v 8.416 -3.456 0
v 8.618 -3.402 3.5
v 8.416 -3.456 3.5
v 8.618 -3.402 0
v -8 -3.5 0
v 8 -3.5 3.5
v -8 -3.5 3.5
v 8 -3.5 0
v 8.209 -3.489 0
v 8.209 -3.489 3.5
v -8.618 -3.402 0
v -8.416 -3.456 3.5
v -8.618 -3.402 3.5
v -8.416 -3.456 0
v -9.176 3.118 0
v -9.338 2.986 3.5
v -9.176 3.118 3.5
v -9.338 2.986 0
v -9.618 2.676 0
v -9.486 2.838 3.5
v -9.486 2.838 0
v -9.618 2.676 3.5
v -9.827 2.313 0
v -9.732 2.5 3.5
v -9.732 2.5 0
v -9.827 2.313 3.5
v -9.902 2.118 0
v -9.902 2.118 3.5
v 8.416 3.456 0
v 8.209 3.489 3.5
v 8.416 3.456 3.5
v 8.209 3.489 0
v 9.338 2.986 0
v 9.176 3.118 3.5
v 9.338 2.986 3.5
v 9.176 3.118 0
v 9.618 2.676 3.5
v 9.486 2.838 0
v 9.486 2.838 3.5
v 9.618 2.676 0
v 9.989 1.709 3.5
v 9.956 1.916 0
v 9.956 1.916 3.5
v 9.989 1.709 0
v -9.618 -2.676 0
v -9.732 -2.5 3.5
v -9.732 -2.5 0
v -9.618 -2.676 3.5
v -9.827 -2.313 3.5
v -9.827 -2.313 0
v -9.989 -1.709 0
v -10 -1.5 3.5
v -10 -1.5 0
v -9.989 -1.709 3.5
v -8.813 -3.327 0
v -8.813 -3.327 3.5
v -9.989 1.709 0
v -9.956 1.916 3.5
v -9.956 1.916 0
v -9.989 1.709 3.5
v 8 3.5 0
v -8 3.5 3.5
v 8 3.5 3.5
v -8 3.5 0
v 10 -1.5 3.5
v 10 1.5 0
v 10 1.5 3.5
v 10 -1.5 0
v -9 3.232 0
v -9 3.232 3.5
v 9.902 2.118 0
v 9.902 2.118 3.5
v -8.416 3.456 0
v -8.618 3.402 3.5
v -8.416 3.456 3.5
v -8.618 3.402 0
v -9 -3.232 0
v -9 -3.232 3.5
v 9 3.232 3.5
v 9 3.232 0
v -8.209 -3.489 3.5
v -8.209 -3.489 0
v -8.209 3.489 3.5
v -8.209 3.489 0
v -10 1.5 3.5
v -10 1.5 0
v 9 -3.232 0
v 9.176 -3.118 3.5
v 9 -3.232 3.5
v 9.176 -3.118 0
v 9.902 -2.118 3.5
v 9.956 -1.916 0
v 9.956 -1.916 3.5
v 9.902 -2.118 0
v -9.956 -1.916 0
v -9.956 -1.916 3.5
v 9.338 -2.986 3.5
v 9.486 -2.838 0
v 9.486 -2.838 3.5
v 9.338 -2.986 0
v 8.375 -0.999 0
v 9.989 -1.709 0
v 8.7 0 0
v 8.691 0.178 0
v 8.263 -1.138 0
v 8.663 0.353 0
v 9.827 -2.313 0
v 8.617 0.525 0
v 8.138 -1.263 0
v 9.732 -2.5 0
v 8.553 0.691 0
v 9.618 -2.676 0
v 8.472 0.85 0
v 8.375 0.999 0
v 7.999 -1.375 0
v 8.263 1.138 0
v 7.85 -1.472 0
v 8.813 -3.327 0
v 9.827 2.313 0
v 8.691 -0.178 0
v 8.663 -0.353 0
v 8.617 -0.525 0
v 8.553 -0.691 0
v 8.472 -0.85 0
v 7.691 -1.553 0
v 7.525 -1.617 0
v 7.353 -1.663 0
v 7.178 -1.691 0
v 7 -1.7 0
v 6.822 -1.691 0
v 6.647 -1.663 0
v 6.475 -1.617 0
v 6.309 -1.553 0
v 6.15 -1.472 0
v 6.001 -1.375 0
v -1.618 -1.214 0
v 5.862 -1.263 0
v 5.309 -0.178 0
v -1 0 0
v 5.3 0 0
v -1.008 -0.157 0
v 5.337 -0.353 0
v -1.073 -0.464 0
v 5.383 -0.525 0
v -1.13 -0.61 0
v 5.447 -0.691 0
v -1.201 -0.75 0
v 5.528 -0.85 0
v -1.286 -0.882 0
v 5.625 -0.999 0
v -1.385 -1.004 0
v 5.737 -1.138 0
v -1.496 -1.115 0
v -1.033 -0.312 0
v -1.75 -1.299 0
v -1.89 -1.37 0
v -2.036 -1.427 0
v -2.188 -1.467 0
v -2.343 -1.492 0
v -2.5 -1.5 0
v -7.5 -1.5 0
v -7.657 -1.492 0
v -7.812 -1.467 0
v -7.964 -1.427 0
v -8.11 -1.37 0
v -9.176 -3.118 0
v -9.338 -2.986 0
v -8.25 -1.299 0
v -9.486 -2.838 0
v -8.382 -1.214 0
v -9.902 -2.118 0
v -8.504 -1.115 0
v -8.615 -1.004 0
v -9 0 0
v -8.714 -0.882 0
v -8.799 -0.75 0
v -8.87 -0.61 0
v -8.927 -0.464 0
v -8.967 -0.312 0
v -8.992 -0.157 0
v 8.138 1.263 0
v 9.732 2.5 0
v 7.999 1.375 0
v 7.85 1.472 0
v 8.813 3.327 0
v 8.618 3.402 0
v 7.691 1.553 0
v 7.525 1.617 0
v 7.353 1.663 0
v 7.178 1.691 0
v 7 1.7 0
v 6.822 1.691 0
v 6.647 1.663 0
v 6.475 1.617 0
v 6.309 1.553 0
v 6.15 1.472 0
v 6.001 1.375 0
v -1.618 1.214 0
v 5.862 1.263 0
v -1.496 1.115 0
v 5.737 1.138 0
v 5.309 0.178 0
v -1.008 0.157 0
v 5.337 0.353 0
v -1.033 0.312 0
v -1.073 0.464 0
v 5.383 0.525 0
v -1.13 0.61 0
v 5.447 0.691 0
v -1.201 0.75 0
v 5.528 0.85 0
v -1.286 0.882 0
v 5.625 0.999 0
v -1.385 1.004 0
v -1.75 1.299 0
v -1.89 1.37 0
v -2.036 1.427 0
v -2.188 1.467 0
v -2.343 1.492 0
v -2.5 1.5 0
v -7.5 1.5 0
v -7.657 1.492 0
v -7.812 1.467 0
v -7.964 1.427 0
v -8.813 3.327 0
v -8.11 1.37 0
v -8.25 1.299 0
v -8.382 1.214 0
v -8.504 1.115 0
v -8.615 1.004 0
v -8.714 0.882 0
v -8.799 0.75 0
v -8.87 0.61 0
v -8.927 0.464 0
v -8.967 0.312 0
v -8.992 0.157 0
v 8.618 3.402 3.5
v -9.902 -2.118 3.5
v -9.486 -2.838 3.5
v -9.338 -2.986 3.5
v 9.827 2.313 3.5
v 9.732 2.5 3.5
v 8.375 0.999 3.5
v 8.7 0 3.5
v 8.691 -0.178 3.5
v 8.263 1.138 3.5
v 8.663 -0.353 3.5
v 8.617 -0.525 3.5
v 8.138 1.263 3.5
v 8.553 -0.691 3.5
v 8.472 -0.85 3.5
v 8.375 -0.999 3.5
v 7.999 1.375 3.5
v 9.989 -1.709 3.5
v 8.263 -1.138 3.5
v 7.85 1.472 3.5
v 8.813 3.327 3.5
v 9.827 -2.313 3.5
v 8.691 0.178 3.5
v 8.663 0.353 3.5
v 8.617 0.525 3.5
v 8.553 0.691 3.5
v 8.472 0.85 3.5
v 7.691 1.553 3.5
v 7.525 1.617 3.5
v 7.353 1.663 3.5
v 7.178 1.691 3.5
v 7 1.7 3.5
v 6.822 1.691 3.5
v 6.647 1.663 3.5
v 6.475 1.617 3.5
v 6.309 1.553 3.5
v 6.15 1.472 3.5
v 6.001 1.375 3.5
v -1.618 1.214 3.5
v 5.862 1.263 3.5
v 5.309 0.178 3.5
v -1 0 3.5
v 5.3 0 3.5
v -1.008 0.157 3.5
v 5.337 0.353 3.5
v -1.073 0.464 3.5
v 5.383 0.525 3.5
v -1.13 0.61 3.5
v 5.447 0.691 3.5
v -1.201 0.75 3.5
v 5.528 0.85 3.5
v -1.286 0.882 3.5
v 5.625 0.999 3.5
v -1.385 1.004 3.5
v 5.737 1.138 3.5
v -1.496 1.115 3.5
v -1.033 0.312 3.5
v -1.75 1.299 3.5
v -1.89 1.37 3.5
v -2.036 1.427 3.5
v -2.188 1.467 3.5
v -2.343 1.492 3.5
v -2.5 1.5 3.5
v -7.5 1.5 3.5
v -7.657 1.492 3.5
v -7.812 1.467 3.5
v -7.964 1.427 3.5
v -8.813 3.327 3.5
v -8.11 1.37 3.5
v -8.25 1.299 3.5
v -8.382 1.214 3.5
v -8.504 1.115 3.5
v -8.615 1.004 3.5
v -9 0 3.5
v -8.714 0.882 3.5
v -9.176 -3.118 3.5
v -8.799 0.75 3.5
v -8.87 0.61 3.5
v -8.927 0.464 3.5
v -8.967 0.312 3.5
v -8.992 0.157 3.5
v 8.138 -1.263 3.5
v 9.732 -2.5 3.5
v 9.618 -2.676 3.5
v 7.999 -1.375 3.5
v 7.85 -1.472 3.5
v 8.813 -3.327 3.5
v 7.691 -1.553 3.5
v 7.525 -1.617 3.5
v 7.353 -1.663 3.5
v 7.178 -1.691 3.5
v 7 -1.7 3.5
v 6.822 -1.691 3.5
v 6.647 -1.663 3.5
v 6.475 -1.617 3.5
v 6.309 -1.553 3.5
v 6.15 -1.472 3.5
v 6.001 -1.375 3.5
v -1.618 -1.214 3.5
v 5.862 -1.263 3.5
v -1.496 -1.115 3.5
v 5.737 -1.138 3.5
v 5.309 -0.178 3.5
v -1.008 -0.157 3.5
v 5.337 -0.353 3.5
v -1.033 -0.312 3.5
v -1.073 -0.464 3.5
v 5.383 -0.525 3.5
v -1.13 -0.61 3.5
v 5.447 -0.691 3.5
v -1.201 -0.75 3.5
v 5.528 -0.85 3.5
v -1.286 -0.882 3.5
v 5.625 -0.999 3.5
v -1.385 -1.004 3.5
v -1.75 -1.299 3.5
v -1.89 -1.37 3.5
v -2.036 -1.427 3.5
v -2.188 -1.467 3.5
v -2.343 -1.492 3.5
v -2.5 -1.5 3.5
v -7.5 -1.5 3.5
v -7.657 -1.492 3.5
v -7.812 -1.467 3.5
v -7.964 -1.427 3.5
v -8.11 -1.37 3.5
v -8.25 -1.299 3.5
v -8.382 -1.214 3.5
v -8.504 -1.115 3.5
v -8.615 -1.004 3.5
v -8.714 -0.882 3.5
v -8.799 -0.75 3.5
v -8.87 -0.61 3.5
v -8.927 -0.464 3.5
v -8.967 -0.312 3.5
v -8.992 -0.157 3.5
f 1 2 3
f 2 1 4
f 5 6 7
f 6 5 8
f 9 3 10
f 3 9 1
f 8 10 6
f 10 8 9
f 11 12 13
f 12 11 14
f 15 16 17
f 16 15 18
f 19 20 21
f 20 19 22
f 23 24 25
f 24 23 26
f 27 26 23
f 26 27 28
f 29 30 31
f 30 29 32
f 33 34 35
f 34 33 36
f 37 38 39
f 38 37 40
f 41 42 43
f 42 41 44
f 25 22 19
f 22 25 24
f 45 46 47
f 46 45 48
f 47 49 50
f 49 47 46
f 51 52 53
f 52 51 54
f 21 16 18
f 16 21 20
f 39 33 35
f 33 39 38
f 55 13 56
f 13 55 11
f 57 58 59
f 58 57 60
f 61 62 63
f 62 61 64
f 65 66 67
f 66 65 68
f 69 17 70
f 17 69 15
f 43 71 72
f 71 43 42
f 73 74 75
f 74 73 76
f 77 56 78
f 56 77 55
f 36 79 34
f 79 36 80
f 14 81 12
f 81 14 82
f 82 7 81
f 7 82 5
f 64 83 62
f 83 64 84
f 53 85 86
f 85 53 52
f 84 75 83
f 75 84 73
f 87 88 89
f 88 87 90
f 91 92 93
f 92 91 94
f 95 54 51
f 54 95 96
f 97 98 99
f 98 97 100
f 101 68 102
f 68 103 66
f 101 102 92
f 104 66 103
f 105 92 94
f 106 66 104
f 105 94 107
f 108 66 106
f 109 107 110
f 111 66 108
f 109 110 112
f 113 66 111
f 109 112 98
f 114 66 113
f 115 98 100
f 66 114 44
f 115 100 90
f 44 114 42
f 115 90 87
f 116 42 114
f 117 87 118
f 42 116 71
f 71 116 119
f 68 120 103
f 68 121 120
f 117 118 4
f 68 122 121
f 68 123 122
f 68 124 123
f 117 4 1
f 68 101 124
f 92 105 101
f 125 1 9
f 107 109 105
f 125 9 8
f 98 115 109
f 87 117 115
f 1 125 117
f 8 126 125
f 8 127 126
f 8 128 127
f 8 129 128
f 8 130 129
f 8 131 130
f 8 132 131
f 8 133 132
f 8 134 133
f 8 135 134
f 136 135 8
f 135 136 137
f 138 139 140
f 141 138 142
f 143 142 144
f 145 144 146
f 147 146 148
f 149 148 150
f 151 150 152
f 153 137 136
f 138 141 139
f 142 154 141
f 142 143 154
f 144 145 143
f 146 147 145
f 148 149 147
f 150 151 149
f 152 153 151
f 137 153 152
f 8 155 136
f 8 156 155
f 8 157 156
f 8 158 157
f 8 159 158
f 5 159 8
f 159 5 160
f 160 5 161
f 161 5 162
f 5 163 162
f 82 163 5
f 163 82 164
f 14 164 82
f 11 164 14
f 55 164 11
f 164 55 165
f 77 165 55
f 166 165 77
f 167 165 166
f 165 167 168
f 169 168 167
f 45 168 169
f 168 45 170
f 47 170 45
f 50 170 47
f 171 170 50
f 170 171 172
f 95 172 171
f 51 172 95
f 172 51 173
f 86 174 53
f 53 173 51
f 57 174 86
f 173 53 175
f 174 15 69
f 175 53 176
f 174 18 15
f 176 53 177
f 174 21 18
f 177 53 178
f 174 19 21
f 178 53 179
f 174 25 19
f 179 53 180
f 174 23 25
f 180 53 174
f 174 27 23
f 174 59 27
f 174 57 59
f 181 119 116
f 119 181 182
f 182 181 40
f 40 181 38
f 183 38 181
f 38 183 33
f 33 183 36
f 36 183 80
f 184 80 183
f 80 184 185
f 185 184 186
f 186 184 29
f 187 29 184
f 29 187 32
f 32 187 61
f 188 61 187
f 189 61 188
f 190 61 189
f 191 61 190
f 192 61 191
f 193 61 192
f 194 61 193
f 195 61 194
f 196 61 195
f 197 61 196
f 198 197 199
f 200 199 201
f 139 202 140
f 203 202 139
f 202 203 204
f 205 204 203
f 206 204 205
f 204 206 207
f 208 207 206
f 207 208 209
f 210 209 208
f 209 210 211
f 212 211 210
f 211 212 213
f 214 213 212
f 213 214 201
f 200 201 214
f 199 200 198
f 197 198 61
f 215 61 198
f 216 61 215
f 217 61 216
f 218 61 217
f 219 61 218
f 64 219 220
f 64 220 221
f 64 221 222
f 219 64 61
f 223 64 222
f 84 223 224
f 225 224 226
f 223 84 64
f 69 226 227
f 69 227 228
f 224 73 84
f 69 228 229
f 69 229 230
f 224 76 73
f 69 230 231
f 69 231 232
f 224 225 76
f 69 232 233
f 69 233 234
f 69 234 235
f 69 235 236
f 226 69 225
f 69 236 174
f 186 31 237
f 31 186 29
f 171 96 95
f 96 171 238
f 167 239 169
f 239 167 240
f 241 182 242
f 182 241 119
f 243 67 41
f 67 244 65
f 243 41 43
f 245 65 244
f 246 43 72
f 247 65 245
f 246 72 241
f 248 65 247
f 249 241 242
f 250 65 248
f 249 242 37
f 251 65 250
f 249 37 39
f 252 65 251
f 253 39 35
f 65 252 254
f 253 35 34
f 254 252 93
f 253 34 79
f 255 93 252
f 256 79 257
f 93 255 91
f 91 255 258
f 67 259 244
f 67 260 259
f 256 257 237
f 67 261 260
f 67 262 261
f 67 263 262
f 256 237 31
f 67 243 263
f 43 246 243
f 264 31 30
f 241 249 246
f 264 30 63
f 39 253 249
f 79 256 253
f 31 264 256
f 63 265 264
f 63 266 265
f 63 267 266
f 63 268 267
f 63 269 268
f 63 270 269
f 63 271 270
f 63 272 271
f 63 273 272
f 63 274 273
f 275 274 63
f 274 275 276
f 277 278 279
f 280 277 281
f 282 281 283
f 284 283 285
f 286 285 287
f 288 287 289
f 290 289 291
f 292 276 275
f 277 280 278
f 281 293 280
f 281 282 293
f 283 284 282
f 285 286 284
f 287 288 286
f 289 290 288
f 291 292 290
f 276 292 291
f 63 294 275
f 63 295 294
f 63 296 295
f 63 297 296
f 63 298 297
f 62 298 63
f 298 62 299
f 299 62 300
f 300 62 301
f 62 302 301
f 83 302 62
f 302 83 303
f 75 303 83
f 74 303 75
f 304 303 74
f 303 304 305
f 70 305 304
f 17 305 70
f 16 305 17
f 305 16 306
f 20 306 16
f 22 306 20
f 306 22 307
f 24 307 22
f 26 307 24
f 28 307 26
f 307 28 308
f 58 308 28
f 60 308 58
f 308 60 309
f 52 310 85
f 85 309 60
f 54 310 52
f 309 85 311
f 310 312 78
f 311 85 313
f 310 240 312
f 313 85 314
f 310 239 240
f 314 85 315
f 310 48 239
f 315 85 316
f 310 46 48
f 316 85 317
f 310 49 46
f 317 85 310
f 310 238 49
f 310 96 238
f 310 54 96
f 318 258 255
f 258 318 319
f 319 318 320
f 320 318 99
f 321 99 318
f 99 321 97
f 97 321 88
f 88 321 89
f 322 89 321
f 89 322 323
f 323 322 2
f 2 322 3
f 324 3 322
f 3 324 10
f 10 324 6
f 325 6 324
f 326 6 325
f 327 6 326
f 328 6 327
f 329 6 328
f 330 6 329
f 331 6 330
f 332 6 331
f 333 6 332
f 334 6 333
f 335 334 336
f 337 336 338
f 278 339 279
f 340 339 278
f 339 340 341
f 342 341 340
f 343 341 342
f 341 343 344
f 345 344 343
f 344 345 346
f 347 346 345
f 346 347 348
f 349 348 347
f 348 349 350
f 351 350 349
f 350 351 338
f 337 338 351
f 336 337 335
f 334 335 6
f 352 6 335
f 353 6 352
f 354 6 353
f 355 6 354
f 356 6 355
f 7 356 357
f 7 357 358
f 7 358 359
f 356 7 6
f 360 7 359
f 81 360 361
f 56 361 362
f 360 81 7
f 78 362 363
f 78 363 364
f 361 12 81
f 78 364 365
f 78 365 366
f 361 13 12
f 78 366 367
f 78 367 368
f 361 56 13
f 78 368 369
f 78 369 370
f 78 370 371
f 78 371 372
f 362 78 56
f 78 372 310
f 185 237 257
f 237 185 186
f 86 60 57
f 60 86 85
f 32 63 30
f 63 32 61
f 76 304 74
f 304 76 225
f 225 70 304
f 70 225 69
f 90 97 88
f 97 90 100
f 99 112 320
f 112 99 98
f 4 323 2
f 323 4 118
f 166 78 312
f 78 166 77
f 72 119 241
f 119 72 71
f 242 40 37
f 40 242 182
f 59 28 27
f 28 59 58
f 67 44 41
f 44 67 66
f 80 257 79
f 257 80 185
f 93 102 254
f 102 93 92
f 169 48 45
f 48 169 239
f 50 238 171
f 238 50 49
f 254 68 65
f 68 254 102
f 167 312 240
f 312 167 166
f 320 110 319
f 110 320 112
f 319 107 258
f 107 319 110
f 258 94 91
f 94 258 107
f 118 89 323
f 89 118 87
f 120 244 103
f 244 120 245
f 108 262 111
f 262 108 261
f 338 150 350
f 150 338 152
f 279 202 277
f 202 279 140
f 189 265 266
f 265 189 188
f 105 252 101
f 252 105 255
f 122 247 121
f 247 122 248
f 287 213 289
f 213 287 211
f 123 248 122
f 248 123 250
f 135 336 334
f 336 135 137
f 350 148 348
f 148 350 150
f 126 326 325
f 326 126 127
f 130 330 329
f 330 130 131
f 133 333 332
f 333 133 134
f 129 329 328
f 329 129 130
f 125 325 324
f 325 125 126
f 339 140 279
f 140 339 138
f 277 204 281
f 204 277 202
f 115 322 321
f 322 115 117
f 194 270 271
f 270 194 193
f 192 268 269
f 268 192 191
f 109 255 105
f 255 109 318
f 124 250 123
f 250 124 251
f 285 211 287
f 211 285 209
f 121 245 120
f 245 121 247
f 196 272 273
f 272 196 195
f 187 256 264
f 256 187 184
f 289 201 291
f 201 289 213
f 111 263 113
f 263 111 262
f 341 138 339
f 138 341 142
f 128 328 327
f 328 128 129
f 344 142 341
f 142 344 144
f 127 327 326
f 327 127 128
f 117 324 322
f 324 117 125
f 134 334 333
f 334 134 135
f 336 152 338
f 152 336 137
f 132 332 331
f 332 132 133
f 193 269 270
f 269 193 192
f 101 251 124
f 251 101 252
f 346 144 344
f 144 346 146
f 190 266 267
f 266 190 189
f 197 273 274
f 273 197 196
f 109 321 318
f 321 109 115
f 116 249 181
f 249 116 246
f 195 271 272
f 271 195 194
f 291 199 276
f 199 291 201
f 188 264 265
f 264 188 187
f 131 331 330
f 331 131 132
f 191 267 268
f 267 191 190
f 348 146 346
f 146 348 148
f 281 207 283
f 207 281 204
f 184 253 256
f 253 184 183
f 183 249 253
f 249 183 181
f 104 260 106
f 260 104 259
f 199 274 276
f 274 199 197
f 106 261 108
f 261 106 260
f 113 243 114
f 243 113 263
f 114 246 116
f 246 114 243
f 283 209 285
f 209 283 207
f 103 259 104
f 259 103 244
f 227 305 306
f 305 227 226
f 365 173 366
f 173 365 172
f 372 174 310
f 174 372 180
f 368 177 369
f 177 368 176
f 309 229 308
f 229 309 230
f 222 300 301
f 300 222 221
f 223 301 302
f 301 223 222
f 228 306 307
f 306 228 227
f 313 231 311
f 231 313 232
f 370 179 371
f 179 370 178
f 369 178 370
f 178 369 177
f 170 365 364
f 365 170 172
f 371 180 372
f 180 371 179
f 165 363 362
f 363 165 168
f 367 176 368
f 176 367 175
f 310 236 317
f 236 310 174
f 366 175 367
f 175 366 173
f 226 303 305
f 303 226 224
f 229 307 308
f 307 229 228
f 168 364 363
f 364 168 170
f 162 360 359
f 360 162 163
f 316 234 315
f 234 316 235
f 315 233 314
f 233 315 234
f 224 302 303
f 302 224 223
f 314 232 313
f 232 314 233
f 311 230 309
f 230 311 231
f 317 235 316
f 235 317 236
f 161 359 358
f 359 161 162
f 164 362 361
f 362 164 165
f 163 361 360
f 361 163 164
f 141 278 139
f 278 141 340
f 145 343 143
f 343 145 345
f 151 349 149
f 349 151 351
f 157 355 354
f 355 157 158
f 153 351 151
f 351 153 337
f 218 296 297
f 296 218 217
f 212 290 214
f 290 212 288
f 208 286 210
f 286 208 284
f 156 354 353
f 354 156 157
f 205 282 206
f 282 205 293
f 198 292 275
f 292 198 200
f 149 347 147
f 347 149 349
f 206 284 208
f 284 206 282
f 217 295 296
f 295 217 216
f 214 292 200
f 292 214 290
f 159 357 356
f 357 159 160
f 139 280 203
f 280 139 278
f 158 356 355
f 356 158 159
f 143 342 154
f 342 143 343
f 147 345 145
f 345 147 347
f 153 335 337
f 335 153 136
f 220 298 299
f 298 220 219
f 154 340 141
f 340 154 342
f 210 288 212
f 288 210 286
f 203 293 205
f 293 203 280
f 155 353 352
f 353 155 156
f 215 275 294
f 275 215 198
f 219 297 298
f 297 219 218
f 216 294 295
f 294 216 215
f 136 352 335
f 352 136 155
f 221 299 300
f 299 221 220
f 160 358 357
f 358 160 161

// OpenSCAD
// Linkage to connect the Effector to cooling fan shroud

$fn = 60;

difference() {
    linear_extrude(3.5) { offset(r=2) { square([16,3],center=true); } }
    translate([7,0,-1]) { linear_extrude(6){ circle(d=3.4); } }
    translate([-7.5,0,-1]) { linear_extrude(6){ circle(d=3); } }
    translate([-2.5,0,-1]) { linear_extrude(6){ circle(d=3); } }
    translate([-5,0,-1]) { linear_extrude(6){ square([5,3], center=true); } }
}
